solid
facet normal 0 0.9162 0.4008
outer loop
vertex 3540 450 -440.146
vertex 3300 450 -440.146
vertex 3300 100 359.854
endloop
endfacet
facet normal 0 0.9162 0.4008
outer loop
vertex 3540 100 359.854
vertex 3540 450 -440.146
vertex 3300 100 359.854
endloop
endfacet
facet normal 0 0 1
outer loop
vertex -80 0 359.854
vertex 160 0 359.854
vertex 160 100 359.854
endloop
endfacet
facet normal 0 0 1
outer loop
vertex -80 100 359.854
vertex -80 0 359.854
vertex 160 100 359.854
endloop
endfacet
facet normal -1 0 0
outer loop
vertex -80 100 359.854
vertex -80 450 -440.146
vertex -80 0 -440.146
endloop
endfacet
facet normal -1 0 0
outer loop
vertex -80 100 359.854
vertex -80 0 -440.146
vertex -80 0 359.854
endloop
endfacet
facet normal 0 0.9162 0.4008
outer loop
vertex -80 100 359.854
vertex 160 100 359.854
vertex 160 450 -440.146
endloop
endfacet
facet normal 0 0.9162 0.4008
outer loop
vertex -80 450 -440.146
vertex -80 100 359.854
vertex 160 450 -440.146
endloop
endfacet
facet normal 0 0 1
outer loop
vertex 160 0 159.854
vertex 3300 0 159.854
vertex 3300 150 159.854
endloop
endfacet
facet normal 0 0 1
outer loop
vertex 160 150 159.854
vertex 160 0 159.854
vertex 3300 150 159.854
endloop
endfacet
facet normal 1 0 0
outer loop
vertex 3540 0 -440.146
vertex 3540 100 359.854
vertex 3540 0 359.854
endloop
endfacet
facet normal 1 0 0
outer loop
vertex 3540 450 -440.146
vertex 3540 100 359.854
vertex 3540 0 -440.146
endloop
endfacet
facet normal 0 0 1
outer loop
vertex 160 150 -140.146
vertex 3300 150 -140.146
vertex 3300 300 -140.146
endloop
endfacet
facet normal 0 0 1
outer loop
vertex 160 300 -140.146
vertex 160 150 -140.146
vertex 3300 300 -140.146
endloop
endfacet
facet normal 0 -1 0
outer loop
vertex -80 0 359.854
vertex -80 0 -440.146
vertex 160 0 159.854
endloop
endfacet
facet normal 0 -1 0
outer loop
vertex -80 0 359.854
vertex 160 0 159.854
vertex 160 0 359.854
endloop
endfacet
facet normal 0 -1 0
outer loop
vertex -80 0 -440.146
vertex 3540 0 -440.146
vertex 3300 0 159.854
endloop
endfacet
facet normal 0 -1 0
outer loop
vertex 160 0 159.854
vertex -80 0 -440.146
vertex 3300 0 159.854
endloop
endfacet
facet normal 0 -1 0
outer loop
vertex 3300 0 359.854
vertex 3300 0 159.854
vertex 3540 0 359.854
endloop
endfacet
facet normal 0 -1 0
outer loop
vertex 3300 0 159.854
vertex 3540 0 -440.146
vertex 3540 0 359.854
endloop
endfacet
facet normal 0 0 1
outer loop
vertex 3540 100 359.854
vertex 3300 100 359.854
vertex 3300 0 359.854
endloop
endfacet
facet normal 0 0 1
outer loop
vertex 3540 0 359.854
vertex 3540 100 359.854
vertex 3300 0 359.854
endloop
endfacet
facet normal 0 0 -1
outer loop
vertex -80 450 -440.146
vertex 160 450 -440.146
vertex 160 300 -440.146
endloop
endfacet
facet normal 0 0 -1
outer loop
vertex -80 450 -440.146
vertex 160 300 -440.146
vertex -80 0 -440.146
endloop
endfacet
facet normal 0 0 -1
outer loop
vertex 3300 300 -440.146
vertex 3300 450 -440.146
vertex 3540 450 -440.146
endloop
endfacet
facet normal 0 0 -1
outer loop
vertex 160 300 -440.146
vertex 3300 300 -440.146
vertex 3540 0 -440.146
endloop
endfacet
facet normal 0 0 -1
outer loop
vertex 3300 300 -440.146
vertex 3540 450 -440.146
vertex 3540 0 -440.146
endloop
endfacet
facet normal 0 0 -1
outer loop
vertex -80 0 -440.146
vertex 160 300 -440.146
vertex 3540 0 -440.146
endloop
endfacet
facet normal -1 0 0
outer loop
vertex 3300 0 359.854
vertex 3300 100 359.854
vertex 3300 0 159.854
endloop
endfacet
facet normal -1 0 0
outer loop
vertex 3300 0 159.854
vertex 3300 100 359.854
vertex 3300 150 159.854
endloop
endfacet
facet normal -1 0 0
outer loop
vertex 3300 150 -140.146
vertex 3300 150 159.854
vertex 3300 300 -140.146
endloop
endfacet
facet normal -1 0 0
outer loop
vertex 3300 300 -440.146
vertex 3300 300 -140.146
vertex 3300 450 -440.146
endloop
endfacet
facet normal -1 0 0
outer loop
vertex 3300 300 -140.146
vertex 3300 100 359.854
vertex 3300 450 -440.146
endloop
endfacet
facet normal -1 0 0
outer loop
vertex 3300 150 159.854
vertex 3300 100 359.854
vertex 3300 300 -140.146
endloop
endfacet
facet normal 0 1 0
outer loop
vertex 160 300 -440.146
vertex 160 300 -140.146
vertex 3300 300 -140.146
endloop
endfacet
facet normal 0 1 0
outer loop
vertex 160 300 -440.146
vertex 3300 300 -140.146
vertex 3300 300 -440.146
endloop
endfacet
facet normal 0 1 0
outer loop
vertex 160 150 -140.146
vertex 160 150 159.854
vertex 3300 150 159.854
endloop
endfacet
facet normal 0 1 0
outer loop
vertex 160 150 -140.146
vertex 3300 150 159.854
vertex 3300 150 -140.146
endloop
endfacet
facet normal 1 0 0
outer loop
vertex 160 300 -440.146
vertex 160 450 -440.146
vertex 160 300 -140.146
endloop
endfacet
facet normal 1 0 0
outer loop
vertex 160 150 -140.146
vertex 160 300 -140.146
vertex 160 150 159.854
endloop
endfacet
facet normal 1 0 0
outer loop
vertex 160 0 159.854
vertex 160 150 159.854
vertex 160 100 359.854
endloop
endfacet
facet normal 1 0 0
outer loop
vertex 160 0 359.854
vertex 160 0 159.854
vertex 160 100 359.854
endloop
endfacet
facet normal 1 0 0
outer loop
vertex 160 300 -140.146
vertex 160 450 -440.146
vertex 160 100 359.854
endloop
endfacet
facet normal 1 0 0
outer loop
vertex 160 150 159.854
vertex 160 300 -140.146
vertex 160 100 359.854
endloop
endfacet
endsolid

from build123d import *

# Parameters (mm, degrees)
EXTRUDE_1_DEPTH     = 3300
EXTRUDE_2_DEPTH     = 240
CUT_EXTRUDE_1_DEPTH = 160
EXTRUDE_3_DEPTH     = 240


with BuildPart() as part:
    # 草图1 → 凸台-拉伸1 (new body)
    with BuildSketch(Plane(origin=(0, 0, 0), x_dir=(0, 0, -1), z_dir=(1, 0, 0))):
        Polygon((440.145985401, 300), (440.145985401, 0), (-159.854014599, 0), (-159.854014599, 150), (140.145985401, 150), (140.145985401, 300), align=None)
    extrude(amount=EXTRUDE_1_DEPTH)

    # 草图2 → 凸台-拉伸2 (add)
    with BuildSketch(Plane(origin=(3300, 0, 0), x_dir=(0, 0, -1), z_dir=(1, 0, 0))):
        Polygon((440.145985401, 450), (-359.854014599, 100), (-359.854014599, 0), (440.145985401, 0), align=None)
    extrude(amount=EXTRUDE_2_DEPTH)

    # 草图3 → 切除-拉伸1 (cut)
    with BuildSketch(Plane.ZY):
        Polygon((-440.145985401, 300), (-440.145985401, 0), (159.854014599, 0), (159.854014599, 150), (-140.145985401, 150), (-140.145985401, 300), align=None)
    extrude(amount=-CUT_EXTRUDE_1_DEPTH, mode=Mode.SUBTRACT)

    # 草图4 → 凸台-拉伸3 (add)
    with BuildSketch(Plane.ZY.offset(-160)):
        Polygon((-440.145985401, 450), (-440.145985401, 0), (359.854014599, 0), (359.854014599, 100), align=None)
    extrude(amount=EXTRUDE_3_DEPTH)


solid = part.part
